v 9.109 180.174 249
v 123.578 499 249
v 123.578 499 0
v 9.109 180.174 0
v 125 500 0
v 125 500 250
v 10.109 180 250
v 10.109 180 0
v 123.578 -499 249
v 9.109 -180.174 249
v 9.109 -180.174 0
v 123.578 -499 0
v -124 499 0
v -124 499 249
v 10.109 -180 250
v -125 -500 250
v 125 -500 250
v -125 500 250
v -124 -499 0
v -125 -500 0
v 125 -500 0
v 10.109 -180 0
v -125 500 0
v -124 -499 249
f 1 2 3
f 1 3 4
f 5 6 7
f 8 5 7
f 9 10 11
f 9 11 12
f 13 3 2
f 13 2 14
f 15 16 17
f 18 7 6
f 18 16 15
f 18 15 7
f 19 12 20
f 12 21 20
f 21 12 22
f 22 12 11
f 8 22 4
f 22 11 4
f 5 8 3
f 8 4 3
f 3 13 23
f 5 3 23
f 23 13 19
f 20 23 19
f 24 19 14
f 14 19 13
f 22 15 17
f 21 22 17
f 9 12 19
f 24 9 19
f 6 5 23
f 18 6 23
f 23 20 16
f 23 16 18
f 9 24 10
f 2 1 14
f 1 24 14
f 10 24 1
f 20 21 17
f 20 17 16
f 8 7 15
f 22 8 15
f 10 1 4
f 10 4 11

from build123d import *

# Parameters (mm, degrees)
SKETCH1_W           = 1000
SKETCH1_H           = 250
BOSS_EXTRUDE1_DEPTH = 250
CUT_EXTRUDE1_DEPTH  = 573.821961869
SHELL1_T            = -1


with BuildPart() as part:
    # Sketch1 → Boss-Extrude1 (new body)
    with BuildSketch(Plane(origin=(0, 0, 0), x_dir=(0, 1, 0), z_dir=(0, 0, 1))):
        Rectangle(SKETCH1_W, SKETCH1_H)
    extrude(amount=BOSS_EXTRUDE1_DEPTH)

    # Sketch2 → Cut-Extrude1 (cut, through all)
    with BuildSketch(Plane(origin=(0, 0, 250), x_dir=(0, -1, 0), z_dir=(0, 0, 1))):
        Polygon((-500, 125), (-180, 10.108747069), (180, 10.108747069), (500, 125), align=None)
    extrude(amount=-CUT_EXTRUDE1_DEPTH, mode=Mode.SUBTRACT)

    # Shell1
    shell1_openings = [part.faces().sort_by_distance(p)[0] for p in [
        (-34.803159923, 0, 0),
    ]]
    offset(amount=SHELL1_T, openings=shell1_openings, kind=Kind.INTERSECTION)


solid = part.part
